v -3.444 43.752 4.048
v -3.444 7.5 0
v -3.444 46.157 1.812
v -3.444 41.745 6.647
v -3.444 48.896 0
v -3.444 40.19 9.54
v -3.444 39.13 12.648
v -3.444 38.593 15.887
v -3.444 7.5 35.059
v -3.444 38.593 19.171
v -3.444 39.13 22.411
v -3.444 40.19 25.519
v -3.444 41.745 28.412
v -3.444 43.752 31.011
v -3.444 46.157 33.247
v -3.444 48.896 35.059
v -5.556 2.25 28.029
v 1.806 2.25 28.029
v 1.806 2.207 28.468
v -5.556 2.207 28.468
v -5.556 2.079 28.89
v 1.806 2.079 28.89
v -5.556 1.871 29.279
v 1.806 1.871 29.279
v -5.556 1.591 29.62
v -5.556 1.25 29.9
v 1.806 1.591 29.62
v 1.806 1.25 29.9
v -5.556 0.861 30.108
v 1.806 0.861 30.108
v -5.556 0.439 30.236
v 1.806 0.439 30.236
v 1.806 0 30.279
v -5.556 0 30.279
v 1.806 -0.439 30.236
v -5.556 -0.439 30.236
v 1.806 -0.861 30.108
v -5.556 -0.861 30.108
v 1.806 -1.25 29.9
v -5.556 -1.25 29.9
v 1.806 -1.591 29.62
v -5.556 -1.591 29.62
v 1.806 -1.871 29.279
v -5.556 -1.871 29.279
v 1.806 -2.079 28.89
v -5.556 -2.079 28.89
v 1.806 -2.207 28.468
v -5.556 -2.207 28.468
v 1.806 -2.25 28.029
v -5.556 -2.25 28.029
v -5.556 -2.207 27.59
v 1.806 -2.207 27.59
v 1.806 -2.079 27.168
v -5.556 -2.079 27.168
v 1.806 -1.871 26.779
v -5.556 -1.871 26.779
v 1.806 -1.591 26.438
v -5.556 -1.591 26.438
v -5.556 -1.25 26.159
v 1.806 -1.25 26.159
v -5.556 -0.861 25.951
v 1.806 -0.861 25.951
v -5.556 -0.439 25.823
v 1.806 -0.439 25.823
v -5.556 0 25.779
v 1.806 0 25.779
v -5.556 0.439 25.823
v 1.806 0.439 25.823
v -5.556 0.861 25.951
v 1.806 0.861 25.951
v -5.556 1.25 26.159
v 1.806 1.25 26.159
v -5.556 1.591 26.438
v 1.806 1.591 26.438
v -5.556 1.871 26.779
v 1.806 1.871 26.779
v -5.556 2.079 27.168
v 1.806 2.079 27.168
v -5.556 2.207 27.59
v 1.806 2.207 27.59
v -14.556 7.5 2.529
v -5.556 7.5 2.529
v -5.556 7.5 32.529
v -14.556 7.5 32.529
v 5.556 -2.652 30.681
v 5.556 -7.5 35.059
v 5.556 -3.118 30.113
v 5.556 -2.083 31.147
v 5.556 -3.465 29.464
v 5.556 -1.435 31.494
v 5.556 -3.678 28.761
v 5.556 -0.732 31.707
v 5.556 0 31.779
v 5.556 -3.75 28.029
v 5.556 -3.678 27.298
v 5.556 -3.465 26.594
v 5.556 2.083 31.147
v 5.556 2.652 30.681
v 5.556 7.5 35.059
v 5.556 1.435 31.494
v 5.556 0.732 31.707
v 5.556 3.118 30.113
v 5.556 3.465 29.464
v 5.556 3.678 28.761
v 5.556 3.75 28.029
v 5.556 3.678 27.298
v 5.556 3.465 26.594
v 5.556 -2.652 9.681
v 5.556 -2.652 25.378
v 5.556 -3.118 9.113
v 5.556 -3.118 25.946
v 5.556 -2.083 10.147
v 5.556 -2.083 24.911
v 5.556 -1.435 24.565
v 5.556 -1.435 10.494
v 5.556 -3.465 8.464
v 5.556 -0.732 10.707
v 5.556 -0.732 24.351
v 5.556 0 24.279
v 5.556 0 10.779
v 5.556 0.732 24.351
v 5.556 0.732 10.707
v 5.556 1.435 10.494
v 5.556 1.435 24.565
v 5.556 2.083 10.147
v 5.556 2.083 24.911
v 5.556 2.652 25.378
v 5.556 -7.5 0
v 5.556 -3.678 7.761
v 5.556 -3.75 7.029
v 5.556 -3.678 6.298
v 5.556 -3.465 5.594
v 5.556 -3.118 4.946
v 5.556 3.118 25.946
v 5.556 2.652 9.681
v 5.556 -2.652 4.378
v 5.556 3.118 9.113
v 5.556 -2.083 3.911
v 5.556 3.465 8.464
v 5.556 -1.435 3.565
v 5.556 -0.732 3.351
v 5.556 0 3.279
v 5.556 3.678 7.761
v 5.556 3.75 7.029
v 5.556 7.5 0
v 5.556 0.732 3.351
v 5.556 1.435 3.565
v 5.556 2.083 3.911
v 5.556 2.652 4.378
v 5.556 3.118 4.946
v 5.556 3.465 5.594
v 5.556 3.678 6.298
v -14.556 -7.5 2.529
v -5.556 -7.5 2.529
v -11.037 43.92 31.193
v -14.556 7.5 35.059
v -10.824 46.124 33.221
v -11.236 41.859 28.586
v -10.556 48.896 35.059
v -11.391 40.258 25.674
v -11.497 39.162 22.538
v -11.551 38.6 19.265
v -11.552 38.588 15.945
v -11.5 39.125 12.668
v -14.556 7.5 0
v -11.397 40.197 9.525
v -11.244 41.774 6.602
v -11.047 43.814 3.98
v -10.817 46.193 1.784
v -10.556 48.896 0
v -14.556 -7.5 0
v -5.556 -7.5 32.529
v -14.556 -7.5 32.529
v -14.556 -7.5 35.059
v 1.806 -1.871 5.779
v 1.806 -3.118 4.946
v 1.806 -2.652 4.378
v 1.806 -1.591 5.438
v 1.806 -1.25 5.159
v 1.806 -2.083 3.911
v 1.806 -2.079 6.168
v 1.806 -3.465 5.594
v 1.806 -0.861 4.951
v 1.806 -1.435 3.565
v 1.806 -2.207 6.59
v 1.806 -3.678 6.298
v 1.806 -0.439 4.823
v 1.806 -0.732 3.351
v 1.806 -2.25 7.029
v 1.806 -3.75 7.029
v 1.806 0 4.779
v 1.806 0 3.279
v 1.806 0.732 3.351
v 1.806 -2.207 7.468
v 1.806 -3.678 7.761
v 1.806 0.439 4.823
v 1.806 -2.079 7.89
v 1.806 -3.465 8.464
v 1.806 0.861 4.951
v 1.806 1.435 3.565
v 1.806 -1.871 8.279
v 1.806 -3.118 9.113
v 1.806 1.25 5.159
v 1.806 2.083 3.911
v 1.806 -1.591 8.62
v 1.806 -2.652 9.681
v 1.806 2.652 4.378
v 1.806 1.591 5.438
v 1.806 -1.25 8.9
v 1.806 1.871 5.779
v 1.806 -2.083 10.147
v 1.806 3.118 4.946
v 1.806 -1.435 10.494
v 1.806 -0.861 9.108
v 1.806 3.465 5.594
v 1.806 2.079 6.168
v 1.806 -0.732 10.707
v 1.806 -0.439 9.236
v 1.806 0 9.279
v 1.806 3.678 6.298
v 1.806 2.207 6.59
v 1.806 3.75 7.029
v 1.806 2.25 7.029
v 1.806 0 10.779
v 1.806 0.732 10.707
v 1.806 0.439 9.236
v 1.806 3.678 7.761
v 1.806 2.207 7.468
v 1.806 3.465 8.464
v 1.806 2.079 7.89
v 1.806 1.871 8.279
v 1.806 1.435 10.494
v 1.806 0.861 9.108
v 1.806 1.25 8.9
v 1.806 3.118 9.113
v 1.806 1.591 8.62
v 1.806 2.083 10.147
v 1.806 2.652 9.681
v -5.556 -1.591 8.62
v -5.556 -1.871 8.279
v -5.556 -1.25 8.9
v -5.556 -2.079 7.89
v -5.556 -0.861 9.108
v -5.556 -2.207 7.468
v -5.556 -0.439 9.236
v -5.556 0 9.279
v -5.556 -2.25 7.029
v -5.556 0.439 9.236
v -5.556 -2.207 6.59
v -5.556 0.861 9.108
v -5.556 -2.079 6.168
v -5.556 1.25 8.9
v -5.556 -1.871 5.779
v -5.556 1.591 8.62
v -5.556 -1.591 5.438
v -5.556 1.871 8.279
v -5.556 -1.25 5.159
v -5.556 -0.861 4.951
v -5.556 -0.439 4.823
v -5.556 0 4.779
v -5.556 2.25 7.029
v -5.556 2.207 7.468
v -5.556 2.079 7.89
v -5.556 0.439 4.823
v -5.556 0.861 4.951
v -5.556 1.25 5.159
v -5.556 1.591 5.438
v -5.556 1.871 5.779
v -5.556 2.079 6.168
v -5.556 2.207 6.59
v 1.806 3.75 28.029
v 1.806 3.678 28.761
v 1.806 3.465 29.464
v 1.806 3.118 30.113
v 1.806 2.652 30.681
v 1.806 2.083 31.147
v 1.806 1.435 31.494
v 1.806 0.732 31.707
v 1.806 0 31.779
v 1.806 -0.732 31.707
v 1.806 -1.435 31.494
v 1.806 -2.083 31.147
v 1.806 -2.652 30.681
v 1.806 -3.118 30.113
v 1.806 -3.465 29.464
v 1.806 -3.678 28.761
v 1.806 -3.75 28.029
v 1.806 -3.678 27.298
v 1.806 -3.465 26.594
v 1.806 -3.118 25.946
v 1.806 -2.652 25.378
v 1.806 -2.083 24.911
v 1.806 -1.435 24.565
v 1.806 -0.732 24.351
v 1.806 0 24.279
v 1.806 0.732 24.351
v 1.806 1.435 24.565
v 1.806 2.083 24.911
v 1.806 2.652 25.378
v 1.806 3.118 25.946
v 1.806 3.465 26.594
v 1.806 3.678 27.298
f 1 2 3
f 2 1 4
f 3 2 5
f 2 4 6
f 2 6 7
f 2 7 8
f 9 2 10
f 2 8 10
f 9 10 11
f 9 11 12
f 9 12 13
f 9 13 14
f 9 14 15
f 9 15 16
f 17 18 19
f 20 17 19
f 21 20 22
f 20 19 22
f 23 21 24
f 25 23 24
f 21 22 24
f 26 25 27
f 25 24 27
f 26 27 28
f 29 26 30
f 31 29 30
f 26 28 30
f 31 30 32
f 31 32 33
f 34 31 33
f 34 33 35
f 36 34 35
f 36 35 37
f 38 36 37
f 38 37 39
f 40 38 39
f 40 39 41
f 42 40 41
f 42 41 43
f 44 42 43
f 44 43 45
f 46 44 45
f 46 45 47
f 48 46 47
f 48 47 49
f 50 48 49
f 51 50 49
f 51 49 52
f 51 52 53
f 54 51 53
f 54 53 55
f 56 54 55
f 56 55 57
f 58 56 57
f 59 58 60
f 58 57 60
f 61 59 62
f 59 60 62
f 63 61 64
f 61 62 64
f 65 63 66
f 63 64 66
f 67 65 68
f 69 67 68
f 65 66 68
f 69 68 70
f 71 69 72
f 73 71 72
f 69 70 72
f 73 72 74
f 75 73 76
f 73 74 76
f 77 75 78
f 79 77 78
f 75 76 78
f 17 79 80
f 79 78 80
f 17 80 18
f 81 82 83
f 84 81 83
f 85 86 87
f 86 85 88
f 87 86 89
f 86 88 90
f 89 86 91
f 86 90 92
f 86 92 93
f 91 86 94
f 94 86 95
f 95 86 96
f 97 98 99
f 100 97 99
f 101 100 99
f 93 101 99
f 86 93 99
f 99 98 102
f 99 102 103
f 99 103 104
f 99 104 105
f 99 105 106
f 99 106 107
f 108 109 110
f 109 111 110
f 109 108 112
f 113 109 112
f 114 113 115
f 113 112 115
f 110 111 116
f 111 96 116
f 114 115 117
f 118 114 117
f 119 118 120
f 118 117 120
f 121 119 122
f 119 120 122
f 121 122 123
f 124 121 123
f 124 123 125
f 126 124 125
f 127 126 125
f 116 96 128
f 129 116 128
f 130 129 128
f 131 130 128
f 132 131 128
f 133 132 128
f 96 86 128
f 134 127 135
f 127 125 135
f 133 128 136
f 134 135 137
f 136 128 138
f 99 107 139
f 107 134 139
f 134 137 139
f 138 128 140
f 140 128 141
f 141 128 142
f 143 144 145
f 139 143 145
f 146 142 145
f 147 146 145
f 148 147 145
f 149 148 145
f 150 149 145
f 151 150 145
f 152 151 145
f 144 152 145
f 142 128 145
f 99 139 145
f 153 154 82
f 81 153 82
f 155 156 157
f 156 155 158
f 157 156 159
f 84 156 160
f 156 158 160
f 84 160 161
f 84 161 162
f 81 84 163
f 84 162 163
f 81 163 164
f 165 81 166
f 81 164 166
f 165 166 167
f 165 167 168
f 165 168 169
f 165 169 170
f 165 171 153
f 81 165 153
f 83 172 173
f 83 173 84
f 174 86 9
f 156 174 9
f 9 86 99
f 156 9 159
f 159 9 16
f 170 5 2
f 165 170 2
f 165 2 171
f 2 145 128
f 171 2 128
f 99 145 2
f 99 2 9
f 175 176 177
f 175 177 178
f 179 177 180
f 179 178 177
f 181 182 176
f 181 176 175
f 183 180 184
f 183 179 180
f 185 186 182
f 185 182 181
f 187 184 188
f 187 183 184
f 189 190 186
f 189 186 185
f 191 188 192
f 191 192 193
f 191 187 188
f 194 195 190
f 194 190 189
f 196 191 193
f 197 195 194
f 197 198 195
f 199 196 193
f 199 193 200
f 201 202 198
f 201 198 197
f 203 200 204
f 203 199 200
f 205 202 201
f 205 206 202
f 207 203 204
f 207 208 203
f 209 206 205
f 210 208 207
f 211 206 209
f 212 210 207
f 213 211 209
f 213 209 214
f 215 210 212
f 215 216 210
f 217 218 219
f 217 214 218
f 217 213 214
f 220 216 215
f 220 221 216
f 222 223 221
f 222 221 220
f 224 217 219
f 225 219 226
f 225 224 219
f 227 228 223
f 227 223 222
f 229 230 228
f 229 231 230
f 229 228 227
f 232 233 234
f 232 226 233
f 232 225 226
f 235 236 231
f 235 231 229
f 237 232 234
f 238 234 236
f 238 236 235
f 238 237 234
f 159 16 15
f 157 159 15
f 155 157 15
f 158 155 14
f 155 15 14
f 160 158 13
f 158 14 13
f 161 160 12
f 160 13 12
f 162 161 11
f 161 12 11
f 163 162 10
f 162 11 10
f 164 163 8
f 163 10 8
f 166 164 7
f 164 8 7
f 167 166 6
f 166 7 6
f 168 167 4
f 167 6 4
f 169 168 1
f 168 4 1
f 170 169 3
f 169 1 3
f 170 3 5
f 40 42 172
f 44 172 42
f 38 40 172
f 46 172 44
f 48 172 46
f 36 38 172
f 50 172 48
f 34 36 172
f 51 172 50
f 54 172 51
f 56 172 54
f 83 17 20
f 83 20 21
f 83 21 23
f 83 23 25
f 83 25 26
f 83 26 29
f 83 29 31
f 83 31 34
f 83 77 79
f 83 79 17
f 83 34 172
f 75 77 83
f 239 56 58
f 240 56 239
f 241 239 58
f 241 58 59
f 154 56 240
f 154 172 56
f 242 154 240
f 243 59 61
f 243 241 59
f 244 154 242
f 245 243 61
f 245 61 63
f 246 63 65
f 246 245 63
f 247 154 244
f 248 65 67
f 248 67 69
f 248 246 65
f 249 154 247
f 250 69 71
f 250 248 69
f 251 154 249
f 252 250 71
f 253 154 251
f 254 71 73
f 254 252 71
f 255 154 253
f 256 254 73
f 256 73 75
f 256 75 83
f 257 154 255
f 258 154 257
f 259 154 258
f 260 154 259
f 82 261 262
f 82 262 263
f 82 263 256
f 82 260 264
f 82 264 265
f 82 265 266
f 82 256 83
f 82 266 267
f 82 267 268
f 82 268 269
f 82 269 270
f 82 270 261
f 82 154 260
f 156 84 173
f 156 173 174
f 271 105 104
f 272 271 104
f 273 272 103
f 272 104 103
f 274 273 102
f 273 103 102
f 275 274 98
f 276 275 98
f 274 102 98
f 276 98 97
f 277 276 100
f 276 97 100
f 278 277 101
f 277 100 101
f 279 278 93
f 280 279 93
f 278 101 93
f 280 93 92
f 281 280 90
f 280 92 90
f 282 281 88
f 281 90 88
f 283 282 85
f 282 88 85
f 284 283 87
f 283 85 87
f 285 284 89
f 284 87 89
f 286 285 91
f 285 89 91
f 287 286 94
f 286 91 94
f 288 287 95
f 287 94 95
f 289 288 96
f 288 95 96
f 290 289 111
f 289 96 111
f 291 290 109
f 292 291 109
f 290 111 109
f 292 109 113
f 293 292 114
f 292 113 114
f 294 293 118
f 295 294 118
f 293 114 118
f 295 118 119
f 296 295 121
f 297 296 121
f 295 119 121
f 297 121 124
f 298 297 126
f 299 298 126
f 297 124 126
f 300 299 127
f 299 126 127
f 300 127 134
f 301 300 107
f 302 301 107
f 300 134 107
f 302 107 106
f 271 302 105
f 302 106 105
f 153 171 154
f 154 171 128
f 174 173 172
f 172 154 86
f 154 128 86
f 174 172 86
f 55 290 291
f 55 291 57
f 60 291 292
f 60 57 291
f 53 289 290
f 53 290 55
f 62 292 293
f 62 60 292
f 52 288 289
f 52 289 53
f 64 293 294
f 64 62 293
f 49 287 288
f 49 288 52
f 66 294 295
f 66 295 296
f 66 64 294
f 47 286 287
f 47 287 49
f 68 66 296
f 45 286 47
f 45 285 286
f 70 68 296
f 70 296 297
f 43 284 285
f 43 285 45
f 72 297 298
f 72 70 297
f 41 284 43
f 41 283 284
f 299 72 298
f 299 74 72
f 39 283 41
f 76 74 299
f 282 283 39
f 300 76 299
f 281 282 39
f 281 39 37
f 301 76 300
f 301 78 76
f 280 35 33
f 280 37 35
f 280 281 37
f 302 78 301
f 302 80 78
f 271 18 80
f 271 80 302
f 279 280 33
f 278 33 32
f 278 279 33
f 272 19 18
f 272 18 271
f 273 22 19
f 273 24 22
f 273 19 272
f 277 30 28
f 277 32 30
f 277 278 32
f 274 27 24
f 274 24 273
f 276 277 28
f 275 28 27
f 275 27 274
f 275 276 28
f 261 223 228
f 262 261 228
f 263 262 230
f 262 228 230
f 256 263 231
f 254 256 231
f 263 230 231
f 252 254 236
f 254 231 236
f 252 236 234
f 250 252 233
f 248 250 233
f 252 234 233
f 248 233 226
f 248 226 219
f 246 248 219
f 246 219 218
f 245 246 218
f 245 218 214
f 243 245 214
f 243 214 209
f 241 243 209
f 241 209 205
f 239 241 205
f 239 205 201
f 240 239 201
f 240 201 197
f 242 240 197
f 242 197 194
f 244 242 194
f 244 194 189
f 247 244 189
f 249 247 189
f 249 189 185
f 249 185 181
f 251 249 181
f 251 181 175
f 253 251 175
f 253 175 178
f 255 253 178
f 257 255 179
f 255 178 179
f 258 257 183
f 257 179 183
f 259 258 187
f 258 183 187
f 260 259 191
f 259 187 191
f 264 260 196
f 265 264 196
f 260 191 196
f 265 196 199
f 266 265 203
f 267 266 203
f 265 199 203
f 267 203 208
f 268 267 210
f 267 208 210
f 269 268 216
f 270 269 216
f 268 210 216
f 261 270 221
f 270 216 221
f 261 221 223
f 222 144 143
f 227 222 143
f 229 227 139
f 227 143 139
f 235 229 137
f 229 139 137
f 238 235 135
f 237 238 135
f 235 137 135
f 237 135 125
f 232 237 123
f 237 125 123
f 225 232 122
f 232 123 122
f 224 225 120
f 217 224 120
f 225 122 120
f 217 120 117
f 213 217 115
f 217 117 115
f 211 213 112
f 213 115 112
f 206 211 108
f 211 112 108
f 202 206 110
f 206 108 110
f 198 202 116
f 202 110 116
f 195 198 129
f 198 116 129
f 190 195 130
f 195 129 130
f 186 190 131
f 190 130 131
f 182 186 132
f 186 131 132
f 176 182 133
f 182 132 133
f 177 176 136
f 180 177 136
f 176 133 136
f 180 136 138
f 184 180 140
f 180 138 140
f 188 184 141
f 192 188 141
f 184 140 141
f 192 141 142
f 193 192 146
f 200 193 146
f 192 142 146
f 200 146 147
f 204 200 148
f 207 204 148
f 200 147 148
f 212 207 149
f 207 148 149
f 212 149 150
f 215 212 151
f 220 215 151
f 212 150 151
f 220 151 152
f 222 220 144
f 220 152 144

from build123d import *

# Parameters (mm, degrees)
GRIPPER_ATTACHMENT_BASE_SKETCH_W = 11.1125
GRIPPER_ATTACHMENT_BASE_SKETCH_H = 15
GRIPPER_ATTACHMENT_BASE_DEPTH    = 35.0588586
THROUGH_HOLES_SKETCH_R           = 2.25
SCREW_THROUGH_HOLES_DEPTH        = 38.534800154
SOCKET_RECESSES_SKETCH_R         = 3.75
SOCKET_RECESSES_DEPTH            = 3.75
FINGER_CAVITY_SKETCH_W           = 2.5294293
FINGER_CAVITY_SKETCH_H           = 15
FINGER_CAVITY_DEPTH              = 9
THICKENER_BASE_DEPTH             = 11.1125
THICKNESS_CUTOFF_SKETCH_W        = 61.996732773
THICKNESS_CUTOFF_SKETCH_H        = 64.835459205
THICKNESS_CUTOFF_DEPTH           = 63.508667222


with BuildPart() as part:
    # Gripper Attachment Base Sketch → Gripper Attachment Base (new body)
    with BuildSketch(Plane.XY):
        Rectangle(GRIPPER_ATTACHMENT_BASE_SKETCH_W, GRIPPER_ATTACHMENT_BASE_SKETCH_H)
    extrude(amount=GRIPPER_ATTACHMENT_BASE_DEPTH)

    # Through-Holes Sketch → Screw Through-Holes (cut, through all)
    with BuildSketch(Plane(origin=(5.55625, 0, 0), x_dir=(0, 0, -1), z_dir=(1, 0, 0))):
        with Locations(Location((-28.0294293, 0, 0), (0, 0, 90))):
            Circle(THROUGH_HOLES_SKETCH_R)
        with Locations(Location((-7.0294293, 0, 0), (0, 0, 90))):
            Circle(THROUGH_HOLES_SKETCH_R)
    extrude(amount=-SCREW_THROUGH_HOLES_DEPTH, mode=Mode.SUBTRACT)

    # Socket Recesses Sketch → Socket Recesses (cut)
    with BuildSketch(Plane(origin=(5.55625, 0, 0), x_dir=(0, 0, -1), z_dir=(1, 0, 0))):
        with Locations(Location((-28.0294293, 0, 0), (0, 0, 90))):
            Circle(SOCKET_RECESSES_SKETCH_R)
        with Locations(Location((-7.0294293, 0, 0), (0, 0, 90))):
            Circle(SOCKET_RECESSES_SKETCH_R)
    extrude(amount=-SOCKET_RECESSES_DEPTH, mode=Mode.SUBTRACT)

    # Finger Cavity Sketch → Finger Cavity (add)
    with BuildSketch(Plane.ZY.offset(5.55625)):
        with Locations((1.26471465, 0)):
            Rectangle(FINGER_CAVITY_SKETCH_W, FINGER_CAVITY_SKETCH_H)
        with Locations((33.79414395, 0)):
            Rectangle(FINGER_CAVITY_SKETCH_W, FINGER_CAVITY_SKETCH_H)
    extrude(amount=FINGER_CAVITY_DEPTH)

    # Thickener Base Sketch → Thickener Base (add)
    with BuildSketch(Plane(origin=(-3.44375, 0, 0), x_dir=(0, 0, -1), z_dir=(1, 0, 0))):
        with BuildLine():
            Line((0, 7.5), (-35.0588586, 7.5))
            Line((-35.0588586, 7.5), (-35.0588586, 48.89593))
            ThreePointArc((-35.0588586, 48.89593), (-17.5294293, 38.525006197), (0, 48.89593))
            Line((0, 48.89593), (0, 7.5))
        make_face()
    extrude(amount=-THICKENER_BASE_DEPTH)

    # Thickness Cutoff Sketch → Thickness Cutoff (cut, through all)
    with BuildSketch(Plane(origin=(-15.139601336, 1.462907231, 0), x_dir=(0, 0, -1), z_dir=(0.9953639682653084, -0.09617988708216554, 0))):
        with Locations((-17.347442804, 24.375229456)):
            Rectangle(THICKNESS_CUTOFF_SKETCH_W, THICKNESS_CUTOFF_SKETCH_H)
    extrude(amount=-THICKNESS_CUTOFF_DEPTH, mode=Mode.SUBTRACT)


solid = part.part
